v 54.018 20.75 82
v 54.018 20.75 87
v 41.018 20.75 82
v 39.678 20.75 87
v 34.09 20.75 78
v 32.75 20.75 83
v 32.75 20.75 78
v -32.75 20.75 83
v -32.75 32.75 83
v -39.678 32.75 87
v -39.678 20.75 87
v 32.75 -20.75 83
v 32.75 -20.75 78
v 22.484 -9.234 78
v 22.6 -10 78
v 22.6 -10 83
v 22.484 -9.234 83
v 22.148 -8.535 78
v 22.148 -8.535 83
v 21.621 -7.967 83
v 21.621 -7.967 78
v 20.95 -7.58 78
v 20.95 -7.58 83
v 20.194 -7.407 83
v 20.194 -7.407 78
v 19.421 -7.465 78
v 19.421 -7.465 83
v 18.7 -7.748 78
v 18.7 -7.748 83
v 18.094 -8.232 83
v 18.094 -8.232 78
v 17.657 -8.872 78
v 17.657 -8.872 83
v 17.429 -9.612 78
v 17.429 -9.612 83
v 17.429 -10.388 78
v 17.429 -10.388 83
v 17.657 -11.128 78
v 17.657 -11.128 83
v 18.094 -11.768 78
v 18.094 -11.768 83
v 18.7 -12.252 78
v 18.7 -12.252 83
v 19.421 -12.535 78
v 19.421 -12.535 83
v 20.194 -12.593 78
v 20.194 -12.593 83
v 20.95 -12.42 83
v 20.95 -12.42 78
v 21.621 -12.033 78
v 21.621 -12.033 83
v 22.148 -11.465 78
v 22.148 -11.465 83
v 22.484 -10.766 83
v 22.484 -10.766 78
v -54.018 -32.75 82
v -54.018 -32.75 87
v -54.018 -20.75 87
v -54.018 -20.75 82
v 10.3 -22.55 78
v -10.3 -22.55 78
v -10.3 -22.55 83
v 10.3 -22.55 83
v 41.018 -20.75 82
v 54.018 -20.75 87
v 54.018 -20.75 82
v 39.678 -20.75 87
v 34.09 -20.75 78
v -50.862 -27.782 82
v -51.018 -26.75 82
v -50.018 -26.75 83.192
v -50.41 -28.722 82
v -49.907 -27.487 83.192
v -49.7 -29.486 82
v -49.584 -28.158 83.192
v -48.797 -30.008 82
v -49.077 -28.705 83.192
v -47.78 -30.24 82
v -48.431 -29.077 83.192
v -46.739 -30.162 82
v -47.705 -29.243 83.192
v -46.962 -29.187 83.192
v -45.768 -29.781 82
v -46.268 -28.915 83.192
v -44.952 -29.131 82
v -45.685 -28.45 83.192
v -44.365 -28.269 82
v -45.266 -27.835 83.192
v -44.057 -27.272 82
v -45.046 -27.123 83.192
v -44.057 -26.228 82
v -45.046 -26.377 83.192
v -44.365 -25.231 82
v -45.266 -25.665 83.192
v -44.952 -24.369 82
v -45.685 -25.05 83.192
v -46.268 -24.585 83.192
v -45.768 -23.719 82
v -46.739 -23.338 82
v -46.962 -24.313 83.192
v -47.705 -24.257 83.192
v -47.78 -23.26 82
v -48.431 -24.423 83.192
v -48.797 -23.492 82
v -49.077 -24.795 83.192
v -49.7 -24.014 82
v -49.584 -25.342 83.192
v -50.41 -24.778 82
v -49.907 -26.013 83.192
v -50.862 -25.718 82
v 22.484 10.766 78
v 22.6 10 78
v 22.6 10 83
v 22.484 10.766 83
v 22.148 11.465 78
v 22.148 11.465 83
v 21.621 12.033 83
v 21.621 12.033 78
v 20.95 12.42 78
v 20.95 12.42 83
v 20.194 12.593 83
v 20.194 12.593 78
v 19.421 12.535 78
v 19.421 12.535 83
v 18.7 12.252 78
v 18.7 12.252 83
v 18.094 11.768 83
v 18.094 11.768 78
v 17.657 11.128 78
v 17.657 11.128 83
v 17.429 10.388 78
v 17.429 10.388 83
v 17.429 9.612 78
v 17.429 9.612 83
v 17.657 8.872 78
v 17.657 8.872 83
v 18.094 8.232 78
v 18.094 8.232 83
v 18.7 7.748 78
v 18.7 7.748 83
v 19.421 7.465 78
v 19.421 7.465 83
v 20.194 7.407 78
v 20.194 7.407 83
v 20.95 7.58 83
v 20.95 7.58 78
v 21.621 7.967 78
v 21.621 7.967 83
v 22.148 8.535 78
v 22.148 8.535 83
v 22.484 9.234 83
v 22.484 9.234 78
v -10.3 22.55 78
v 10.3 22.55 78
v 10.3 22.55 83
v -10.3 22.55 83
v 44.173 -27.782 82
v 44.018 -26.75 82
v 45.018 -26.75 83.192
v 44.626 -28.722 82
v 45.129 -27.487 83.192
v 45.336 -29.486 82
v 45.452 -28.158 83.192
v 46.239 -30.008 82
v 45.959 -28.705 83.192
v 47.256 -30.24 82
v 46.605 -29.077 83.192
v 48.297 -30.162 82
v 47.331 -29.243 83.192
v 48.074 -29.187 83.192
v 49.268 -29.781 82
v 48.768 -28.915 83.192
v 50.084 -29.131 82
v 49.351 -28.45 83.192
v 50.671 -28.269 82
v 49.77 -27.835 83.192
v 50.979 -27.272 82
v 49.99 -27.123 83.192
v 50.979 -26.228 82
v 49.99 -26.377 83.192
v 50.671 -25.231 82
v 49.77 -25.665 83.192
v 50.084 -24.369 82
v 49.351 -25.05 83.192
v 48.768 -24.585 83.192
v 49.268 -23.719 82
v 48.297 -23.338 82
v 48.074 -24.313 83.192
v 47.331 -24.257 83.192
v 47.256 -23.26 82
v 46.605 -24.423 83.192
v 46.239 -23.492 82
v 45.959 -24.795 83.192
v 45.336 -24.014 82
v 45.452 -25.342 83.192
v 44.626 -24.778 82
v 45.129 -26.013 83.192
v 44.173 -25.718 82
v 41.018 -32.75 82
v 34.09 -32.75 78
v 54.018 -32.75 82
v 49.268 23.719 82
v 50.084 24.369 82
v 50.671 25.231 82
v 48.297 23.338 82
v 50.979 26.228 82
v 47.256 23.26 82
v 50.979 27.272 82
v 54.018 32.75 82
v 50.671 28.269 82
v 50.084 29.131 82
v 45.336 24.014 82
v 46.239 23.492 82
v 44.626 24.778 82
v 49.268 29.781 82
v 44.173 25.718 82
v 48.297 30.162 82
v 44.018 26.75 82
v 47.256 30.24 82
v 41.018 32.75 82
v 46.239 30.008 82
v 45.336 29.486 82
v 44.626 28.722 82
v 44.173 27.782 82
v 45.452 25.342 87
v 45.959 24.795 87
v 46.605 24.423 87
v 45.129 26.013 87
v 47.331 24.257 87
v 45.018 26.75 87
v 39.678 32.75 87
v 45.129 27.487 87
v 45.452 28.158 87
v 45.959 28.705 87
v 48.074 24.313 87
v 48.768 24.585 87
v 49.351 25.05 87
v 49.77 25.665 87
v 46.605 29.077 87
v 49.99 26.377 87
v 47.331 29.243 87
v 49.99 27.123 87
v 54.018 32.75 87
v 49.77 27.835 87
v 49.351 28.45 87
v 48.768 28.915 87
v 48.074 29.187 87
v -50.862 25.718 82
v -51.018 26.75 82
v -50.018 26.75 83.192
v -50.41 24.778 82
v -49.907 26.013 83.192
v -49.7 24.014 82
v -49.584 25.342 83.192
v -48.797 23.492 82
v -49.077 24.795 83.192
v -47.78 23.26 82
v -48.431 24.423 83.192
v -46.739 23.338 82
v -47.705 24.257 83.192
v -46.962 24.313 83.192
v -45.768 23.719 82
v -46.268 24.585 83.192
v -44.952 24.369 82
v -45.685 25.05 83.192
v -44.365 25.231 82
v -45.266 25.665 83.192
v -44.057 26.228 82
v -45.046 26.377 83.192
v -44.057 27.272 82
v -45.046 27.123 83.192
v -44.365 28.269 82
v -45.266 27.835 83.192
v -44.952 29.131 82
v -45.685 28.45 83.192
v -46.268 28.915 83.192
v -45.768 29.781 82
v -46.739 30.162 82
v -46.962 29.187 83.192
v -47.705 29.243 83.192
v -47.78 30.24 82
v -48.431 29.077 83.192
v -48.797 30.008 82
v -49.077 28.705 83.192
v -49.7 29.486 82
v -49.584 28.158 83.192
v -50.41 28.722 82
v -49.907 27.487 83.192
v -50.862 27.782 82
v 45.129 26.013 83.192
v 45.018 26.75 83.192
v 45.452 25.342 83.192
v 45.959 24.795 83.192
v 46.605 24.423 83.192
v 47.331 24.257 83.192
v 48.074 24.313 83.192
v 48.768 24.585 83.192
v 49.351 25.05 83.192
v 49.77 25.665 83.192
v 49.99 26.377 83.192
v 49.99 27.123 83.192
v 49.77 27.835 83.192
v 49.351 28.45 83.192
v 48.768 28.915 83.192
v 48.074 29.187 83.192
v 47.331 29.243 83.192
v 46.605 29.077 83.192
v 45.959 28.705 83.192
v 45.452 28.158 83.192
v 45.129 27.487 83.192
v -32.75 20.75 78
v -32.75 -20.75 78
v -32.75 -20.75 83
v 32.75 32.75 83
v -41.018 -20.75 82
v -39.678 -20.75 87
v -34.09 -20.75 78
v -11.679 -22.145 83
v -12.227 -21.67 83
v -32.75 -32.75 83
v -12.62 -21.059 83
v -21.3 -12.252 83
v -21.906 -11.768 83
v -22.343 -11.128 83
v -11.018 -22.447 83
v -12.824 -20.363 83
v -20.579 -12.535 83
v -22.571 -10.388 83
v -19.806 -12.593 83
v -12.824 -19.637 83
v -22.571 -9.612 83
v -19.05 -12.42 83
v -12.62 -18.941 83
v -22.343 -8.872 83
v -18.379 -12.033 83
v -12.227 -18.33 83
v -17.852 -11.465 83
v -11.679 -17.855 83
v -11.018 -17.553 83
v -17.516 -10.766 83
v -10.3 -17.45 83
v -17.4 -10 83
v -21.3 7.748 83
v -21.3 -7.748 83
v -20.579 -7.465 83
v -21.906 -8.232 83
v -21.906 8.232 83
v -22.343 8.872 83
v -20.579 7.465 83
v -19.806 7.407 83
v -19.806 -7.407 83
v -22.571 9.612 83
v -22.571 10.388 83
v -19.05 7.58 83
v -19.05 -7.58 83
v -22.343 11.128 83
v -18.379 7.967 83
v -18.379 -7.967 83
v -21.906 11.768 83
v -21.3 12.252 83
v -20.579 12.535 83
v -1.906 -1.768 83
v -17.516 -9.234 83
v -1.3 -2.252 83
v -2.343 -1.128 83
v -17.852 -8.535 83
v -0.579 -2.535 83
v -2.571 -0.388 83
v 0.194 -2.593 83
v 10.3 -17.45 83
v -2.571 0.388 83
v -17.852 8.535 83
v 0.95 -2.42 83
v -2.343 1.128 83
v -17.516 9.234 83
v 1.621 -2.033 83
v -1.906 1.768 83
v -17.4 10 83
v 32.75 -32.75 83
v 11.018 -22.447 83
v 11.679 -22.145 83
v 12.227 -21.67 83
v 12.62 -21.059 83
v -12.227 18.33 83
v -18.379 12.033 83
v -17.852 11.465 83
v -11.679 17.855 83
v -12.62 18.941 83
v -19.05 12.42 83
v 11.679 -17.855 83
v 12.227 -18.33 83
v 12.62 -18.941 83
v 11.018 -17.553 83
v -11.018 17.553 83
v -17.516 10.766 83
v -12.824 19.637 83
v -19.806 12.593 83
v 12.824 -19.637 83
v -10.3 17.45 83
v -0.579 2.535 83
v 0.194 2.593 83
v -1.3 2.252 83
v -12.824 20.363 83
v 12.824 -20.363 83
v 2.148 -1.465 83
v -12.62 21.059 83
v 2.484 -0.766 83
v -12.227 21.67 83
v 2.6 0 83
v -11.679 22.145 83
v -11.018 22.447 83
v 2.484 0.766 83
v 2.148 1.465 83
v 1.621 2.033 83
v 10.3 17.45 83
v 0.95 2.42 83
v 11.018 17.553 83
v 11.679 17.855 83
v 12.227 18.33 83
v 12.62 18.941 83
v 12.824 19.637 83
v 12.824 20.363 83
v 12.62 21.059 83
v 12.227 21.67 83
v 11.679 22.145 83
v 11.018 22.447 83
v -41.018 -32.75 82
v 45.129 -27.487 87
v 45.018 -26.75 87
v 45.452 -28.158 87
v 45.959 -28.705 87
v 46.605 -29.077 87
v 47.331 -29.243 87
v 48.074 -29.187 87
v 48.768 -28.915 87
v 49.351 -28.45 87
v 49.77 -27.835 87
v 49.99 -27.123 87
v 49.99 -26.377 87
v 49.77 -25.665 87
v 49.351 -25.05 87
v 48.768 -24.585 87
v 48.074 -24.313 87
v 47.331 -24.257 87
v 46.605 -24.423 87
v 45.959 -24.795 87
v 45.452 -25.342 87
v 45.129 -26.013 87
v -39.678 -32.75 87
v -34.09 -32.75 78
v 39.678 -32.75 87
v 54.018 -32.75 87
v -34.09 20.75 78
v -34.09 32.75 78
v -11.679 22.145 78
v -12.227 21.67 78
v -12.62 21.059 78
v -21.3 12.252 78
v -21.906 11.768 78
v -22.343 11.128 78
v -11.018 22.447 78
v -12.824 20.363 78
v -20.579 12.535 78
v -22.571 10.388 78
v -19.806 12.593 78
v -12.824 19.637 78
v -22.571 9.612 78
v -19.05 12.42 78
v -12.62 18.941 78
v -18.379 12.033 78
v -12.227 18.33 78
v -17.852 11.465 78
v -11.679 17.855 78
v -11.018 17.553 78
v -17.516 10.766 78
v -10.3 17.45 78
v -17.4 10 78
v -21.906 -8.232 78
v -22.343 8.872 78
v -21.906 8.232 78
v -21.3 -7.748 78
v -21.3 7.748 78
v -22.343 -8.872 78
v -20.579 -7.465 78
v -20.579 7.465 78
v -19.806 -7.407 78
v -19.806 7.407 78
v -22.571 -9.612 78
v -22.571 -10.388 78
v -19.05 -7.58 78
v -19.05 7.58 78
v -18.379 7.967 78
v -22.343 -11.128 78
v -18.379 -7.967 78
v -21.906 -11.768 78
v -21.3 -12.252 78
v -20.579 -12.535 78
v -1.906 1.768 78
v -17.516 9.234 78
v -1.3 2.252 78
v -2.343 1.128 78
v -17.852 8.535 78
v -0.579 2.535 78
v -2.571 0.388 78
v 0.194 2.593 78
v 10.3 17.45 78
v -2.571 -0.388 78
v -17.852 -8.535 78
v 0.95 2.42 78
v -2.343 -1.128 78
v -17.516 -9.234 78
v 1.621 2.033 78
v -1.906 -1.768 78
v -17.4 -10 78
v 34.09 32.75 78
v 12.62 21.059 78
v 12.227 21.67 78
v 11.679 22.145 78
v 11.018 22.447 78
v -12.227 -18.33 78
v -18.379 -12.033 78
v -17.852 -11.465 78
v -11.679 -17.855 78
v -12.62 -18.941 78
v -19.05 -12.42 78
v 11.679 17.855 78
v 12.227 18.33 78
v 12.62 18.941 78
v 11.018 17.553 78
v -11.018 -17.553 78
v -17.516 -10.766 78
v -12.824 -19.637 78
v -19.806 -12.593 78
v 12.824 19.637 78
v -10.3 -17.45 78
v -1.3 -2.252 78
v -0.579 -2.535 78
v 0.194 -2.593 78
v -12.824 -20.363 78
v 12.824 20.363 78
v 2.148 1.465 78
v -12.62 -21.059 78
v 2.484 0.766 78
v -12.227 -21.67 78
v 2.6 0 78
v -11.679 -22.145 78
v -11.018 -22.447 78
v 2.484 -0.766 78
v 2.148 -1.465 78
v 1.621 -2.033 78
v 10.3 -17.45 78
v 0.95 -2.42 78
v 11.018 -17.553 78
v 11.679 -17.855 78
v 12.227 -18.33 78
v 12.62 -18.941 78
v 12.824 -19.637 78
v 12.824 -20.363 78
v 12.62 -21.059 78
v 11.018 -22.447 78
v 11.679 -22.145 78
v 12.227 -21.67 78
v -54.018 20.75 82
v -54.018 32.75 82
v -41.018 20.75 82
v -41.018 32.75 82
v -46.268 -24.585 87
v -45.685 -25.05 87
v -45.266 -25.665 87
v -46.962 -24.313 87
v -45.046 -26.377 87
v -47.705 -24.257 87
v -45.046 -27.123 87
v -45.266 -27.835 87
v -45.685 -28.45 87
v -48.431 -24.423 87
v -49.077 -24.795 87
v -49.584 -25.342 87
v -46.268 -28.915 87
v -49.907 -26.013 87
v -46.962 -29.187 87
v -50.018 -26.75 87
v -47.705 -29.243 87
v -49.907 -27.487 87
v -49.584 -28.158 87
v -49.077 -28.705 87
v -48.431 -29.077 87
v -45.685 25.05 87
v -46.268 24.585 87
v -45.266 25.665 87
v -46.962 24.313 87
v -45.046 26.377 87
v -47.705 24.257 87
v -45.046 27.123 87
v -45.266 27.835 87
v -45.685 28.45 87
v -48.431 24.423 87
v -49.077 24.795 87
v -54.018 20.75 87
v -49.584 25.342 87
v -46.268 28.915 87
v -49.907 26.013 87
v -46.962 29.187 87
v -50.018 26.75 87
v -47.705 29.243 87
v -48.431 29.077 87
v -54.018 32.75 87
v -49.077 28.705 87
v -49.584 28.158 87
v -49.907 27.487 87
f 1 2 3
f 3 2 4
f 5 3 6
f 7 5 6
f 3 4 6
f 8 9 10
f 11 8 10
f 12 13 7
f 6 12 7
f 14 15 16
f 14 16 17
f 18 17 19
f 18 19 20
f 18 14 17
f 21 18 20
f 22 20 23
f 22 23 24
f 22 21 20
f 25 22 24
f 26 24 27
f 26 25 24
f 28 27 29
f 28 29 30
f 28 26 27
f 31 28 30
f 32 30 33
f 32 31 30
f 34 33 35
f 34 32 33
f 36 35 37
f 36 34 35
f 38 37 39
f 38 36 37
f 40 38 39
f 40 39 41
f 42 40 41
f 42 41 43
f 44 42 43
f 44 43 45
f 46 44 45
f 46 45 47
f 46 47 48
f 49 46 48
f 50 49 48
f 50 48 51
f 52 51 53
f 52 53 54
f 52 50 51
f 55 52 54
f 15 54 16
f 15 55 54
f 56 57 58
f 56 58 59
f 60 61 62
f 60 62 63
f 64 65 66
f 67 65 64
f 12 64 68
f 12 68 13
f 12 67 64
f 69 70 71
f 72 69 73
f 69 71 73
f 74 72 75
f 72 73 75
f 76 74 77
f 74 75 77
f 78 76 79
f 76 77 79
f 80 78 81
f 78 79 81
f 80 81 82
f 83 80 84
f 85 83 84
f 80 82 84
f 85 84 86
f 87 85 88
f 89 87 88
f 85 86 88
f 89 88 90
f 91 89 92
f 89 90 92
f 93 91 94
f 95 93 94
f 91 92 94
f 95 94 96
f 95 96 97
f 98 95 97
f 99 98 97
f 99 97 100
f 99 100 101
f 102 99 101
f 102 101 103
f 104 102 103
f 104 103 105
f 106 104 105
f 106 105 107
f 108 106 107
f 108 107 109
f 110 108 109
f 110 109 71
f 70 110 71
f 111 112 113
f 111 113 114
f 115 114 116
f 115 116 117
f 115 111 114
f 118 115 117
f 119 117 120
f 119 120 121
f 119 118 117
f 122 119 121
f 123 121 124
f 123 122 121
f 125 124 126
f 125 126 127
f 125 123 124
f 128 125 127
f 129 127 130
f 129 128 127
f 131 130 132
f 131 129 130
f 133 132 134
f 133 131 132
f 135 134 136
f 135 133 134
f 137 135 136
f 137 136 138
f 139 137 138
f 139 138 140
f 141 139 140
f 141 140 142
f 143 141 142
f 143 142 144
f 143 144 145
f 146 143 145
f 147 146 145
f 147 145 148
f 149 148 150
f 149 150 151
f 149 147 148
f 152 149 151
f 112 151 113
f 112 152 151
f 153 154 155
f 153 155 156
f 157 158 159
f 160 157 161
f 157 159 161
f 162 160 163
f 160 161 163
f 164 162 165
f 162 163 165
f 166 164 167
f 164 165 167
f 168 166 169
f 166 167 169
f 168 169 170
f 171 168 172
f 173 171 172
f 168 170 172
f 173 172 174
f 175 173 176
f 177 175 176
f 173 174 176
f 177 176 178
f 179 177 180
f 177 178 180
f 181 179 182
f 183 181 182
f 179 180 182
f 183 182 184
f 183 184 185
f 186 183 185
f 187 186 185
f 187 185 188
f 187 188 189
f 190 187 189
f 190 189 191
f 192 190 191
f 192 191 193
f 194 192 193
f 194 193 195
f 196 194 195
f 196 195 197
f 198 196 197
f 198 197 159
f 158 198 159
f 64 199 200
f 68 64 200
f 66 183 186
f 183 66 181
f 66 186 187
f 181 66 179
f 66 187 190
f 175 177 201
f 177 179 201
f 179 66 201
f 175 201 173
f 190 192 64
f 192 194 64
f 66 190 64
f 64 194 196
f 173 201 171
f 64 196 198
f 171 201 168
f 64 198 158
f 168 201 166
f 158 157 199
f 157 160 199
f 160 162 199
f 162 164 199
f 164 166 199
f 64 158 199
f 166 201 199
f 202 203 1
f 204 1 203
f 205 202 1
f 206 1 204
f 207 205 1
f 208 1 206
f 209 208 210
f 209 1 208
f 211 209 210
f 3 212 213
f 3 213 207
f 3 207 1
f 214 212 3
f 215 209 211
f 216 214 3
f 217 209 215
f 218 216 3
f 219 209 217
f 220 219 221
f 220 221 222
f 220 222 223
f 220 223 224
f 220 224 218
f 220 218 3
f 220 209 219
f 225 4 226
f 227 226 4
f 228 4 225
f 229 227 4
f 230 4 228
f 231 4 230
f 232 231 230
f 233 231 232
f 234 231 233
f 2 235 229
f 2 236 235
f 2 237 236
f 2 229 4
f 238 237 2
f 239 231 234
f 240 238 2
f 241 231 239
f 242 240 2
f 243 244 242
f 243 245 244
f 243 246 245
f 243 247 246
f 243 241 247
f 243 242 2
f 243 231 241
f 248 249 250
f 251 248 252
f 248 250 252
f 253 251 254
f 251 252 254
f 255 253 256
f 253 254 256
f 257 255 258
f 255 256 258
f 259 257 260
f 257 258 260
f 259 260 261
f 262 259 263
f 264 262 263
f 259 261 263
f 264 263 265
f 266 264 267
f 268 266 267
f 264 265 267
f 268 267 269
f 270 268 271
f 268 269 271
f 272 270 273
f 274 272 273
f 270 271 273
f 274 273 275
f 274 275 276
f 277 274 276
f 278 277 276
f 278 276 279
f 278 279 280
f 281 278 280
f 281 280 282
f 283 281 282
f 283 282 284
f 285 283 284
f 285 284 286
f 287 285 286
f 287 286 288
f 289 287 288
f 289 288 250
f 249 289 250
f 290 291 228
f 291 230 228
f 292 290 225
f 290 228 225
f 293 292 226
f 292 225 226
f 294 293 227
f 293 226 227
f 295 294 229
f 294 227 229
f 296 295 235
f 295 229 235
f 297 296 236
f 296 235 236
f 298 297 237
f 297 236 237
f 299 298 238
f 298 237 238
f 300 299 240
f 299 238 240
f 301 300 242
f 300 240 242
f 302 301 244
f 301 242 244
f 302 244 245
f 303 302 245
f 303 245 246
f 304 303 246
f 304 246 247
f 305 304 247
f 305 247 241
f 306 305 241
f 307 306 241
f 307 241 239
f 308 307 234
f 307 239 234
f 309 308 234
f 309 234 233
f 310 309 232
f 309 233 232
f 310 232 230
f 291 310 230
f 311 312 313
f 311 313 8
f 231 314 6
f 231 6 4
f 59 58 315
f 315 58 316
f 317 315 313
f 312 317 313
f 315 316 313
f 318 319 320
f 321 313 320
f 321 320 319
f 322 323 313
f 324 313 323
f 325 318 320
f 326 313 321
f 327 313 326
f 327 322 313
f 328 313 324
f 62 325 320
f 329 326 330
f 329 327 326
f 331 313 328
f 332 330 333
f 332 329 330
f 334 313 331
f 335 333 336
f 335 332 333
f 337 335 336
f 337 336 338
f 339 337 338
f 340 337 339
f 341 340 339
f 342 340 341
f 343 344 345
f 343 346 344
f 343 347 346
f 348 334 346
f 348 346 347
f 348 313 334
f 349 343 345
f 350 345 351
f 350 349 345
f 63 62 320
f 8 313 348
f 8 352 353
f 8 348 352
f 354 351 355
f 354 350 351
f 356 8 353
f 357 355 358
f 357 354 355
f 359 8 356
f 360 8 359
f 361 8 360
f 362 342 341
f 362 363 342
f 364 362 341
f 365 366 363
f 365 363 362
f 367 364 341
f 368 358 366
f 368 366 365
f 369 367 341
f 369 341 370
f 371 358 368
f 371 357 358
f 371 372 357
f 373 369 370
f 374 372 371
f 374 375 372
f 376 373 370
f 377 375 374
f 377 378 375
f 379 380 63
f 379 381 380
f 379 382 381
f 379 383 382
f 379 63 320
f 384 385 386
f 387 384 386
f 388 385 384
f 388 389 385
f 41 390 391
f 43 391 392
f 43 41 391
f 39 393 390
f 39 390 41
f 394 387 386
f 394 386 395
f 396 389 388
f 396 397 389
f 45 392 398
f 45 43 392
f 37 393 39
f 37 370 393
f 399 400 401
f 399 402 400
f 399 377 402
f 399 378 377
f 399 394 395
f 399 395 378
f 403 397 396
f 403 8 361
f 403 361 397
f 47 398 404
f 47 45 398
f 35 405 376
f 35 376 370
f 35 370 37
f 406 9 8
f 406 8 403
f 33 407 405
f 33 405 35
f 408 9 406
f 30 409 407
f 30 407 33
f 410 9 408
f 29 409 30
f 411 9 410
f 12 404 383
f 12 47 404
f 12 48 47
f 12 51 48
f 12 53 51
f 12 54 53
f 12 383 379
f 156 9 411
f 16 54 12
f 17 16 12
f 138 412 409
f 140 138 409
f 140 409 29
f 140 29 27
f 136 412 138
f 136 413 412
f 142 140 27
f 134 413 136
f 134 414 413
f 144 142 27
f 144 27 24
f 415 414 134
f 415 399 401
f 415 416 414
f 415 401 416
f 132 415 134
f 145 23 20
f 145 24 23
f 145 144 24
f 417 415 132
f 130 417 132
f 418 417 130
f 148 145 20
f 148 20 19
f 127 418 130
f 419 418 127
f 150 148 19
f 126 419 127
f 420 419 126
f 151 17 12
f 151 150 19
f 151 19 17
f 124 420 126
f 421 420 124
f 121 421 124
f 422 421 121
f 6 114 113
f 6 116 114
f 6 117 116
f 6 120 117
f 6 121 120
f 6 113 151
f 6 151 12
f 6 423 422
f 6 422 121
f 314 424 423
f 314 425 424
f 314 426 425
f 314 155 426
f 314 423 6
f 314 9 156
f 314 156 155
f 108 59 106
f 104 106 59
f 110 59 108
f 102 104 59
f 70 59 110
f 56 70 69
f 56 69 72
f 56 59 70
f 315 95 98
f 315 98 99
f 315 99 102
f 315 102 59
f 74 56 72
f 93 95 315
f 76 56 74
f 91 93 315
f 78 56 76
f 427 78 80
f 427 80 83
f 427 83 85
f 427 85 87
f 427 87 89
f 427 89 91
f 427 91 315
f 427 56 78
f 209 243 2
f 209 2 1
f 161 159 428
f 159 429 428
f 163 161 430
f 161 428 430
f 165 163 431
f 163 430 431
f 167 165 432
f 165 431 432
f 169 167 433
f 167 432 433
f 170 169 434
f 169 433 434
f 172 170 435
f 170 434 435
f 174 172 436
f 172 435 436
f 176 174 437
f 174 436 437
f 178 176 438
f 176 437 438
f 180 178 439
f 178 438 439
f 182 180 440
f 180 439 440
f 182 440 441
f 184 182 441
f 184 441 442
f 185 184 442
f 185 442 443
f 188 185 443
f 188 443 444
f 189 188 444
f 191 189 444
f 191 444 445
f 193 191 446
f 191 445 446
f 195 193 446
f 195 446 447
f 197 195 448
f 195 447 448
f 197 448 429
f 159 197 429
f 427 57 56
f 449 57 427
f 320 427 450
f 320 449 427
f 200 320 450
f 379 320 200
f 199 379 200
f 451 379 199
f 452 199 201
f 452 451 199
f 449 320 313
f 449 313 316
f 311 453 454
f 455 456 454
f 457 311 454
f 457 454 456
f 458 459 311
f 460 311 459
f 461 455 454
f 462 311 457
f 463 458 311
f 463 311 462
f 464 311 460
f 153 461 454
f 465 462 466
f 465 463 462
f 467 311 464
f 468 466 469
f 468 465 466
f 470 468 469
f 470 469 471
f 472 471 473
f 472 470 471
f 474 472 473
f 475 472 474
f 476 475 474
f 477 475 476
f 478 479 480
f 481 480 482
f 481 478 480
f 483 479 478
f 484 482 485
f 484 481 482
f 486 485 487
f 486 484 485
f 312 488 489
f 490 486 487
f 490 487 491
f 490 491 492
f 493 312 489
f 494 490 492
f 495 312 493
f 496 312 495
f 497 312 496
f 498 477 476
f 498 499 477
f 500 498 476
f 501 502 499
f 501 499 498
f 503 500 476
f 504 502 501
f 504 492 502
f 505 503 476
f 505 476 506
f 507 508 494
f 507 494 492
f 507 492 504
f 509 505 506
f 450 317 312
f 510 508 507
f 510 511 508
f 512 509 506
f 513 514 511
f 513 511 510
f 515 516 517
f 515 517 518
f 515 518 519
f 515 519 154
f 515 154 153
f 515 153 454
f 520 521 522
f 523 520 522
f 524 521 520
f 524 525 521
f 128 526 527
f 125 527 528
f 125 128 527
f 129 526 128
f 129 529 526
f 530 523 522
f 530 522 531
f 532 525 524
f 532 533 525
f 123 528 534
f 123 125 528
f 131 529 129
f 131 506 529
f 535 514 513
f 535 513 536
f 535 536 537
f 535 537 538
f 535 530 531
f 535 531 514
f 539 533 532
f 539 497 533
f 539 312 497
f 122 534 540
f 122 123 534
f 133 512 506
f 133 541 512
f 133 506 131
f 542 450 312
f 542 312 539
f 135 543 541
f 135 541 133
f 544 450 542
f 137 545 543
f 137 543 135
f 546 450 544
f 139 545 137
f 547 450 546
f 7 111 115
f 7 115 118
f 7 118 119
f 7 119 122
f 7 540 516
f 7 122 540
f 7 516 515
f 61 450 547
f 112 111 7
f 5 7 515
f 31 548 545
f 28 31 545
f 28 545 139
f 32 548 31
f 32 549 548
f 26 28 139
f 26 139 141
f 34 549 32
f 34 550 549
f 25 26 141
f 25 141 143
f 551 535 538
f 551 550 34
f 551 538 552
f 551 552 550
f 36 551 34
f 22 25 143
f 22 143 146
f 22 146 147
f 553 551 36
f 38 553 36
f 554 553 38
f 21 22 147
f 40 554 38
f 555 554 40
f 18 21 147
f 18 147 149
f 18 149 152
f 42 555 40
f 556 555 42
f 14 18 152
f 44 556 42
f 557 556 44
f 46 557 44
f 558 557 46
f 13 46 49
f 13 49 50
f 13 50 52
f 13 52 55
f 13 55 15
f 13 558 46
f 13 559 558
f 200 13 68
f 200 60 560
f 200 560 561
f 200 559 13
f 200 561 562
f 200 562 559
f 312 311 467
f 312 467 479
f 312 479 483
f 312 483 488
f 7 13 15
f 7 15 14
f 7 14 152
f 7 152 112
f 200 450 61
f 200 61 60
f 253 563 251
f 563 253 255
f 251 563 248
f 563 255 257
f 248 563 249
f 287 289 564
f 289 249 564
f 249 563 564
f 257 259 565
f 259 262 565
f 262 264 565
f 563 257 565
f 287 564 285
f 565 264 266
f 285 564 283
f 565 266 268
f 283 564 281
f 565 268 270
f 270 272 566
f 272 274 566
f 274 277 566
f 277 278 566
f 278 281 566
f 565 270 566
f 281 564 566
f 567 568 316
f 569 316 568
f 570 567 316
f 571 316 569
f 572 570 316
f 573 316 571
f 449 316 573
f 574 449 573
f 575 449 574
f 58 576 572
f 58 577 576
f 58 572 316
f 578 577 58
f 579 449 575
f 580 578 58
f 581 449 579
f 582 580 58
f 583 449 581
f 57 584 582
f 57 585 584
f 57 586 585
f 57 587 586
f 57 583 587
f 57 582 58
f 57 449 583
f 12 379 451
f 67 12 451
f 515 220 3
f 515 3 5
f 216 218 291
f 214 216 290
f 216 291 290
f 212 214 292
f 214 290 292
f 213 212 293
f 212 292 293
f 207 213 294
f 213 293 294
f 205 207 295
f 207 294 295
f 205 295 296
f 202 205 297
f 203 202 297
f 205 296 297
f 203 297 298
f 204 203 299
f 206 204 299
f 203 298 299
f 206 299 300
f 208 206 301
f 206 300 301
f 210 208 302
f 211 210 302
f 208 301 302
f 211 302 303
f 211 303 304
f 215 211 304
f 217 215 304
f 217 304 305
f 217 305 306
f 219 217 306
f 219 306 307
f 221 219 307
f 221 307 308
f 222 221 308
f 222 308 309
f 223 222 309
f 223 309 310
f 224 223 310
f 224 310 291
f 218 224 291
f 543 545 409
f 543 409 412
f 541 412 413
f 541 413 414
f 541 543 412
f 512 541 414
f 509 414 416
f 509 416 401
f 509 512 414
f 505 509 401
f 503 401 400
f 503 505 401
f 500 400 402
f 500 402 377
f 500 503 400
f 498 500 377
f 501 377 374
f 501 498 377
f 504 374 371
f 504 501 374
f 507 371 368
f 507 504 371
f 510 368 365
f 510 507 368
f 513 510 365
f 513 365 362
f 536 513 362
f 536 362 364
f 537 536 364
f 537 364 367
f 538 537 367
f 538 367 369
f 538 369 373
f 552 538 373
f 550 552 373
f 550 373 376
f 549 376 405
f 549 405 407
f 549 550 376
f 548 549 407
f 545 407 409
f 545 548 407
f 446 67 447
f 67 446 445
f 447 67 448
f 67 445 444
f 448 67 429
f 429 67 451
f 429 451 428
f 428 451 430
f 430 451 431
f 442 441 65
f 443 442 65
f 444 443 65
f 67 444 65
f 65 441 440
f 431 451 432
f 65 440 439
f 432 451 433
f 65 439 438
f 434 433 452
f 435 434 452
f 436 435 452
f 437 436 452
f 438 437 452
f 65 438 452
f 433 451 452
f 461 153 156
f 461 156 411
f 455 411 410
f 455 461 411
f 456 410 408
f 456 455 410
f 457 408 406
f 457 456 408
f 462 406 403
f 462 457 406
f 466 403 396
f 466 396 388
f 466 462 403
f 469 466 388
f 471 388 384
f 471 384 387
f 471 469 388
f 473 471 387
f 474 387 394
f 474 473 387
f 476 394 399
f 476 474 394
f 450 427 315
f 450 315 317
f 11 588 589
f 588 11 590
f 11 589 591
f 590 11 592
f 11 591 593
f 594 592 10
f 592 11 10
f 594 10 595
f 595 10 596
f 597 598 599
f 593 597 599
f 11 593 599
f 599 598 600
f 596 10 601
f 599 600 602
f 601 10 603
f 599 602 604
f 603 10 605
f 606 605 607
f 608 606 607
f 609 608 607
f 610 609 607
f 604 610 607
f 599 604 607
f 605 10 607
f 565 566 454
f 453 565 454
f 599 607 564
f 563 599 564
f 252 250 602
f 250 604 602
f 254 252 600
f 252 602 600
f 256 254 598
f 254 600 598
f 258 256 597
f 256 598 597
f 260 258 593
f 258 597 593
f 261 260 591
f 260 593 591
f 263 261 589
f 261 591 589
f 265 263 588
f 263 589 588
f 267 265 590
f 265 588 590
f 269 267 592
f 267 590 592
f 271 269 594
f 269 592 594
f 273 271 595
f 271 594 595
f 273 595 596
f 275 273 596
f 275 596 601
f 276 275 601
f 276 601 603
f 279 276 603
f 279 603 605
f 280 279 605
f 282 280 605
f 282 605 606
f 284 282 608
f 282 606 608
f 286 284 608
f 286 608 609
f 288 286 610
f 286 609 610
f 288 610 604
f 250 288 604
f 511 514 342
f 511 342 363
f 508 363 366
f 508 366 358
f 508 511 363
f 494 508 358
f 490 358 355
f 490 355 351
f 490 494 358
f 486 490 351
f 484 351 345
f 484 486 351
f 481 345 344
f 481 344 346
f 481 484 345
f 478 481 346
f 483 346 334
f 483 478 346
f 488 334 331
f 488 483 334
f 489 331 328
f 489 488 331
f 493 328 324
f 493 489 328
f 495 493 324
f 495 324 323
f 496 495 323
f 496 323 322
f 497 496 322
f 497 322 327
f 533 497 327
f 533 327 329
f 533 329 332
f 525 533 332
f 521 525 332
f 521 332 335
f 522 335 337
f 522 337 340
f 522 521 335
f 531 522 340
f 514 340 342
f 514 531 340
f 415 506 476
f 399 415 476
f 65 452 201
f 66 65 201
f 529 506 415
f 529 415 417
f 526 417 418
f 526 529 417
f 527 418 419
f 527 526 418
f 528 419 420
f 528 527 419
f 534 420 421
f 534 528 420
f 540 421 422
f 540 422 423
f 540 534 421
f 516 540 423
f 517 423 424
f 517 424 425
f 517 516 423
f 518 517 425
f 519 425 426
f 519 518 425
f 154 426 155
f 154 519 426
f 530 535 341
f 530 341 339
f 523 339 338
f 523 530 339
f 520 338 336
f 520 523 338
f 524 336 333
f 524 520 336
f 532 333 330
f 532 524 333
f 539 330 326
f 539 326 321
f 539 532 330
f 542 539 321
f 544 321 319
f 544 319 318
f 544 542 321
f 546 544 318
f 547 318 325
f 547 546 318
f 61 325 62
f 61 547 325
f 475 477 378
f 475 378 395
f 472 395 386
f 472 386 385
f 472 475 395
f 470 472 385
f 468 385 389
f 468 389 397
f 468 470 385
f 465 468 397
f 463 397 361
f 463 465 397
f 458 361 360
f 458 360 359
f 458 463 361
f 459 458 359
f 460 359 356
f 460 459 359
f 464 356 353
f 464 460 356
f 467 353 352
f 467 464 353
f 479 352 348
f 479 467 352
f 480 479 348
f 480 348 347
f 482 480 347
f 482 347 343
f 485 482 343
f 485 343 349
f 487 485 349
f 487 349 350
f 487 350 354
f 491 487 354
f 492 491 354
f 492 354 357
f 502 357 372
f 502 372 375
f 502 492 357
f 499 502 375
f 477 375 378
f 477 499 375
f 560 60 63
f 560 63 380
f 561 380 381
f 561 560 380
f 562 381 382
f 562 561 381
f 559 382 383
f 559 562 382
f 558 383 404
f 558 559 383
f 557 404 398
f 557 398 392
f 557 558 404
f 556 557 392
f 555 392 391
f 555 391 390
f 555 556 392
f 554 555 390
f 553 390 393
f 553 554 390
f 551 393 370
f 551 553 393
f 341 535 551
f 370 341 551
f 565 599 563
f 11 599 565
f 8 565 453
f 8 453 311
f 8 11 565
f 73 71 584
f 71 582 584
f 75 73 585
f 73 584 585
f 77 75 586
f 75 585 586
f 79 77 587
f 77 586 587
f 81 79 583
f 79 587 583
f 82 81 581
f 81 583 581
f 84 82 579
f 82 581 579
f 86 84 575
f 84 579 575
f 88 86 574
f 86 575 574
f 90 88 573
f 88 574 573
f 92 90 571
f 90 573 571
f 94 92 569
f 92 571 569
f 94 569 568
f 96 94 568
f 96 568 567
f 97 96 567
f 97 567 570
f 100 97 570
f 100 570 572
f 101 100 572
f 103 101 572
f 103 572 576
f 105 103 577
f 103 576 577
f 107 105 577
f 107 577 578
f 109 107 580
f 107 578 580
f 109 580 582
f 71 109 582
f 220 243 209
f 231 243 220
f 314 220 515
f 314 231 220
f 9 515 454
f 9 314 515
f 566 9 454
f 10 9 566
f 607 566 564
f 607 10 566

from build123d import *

# Parameters (mm, degrees)
SKETCH007_W         = 65.5
SKETCH007_H         = 65.5
SKETCH007_R         = 2.6
PAD005_DEPTH        = 5
PAD006_DEPTH        = 12
HOLE_D              = 5
HOLE_DEPTH          = 25
HOLE_CSINK_D        = 7
HOLE_CSINK_ANGLE    = 80
PAD007_DEPTH        = 12
HOLE001_D           = 5
HOLE001_DEPTH       = 25
HOLE001_CSINK_D     = 7
HOLE001_CSINK_ANGLE = 80


with BuildPart() as part:
    # Sketch007 (on Face1 of Binder) → Pad005 (new body)
    with BuildSketch(Plane.XY.offset(78)):
        Rectangle(SKETCH007_W, SKETCH007_H)
        with Locations((-20, -10)):
            Circle(SKETCH007_R, mode=Mode.SUBTRACT)
        with Locations((20, -10)):
            Circle(SKETCH007_R, mode=Mode.SUBTRACT)
        with Locations((-20, 10)):
            Circle(SKETCH007_R, mode=Mode.SUBTRACT)
        with Locations((20, 10)):
            Circle(SKETCH007_R, mode=Mode.SUBTRACT)
        Circle(SKETCH007_R, mode=Mode.SUBTRACT)
        with BuildLine():
            ThreePointArc((-10.3, -17.45), (-12.85, -20), (-10.3, -22.55))
            Line((-10.3, -22.55), (10.3, -22.55))
            ThreePointArc((10.3, -22.55), (12.85, -20), (10.3, -17.45))
            Line((-10.3, -17.45), (10.3, -17.45))
        make_face(mode=Mode.SUBTRACT)
        with BuildLine():
            ThreePointArc((10.3, 17.45), (12.85, 20), (10.3, 22.55))
            Line((10.3, 22.55), (-10.3, 22.55))
            ThreePointArc((-10.3, 22.55), (-12.85, 20), (-10.3, 17.45))
            Line((10.3, 17.45), (-10.3, 17.45))
        make_face(mode=Mode.SUBTRACT)
    extrude(amount=PAD005_DEPTH)

    # Sketch008 (on Face4 of Pad005) → Pad006 (join)
    with BuildSketch(Plane(origin=(0, 32.75, 0), x_dir=(-1, 0, 0), z_dir=(0, 1, 0))):
        Polygon((-39.678203, 87), (-54.017949, 87), (-54.017949, 82), (-41.017949, 82), (-34.089746, 78), (-32.75, 78), (-32.75, 83), align=None)
        Polygon((39.678203, 87), (54.017949, 87), (54.017949, 82), (41.017949, 82), (34.089746, 78), (32.75, 78), (32.75, 83), align=None)
    extrude(amount=-PAD006_DEPTH)

    # Hole
    with Locations(Plane(origin=(0, 0, 82), x_dir=(1, 0, 0), z_dir=(0, 0, -1))):
        with Locations((-47.517949, -26.75), (47.517949, -26.75)):
            CounterSinkHole(HOLE_D / 2, HOLE_CSINK_D / 2, depth=HOLE_DEPTH, counter_sink_angle=HOLE_CSINK_ANGLE)

    # Sketch010 (on Face3 of Hole) → Pad007 (join)
    with BuildSketch(Plane.XZ.offset(32.75)):
        Polygon((-32.75, 83), (-39.678203, 87), (-54.017949, 87), (-54.017949, 82), (-41.017949, 82), (-34.089746, 78), (-32.75, 78), align=None)
        Polygon((32.75, 78), (32.75, 83), (39.678203, 87), (54.017949, 87), (54.017949, 82), (41.017949, 82), (34.089746, 78), align=None)
    extrude(amount=-PAD007_DEPTH)

    # Hole001
    with Locations(Plane(origin=(0, 0, 82), x_dir=(1, 0, 0), z_dir=(0, 0, -1))):
        with Locations((-47.517949, 26.75), (47.517949, 26.75)):
            CounterSinkHole(HOLE001_D / 2, HOLE001_CSINK_D / 2, depth=HOLE001_DEPTH, counter_sink_angle=HOLE001_CSINK_ANGLE)


solid = part.part
